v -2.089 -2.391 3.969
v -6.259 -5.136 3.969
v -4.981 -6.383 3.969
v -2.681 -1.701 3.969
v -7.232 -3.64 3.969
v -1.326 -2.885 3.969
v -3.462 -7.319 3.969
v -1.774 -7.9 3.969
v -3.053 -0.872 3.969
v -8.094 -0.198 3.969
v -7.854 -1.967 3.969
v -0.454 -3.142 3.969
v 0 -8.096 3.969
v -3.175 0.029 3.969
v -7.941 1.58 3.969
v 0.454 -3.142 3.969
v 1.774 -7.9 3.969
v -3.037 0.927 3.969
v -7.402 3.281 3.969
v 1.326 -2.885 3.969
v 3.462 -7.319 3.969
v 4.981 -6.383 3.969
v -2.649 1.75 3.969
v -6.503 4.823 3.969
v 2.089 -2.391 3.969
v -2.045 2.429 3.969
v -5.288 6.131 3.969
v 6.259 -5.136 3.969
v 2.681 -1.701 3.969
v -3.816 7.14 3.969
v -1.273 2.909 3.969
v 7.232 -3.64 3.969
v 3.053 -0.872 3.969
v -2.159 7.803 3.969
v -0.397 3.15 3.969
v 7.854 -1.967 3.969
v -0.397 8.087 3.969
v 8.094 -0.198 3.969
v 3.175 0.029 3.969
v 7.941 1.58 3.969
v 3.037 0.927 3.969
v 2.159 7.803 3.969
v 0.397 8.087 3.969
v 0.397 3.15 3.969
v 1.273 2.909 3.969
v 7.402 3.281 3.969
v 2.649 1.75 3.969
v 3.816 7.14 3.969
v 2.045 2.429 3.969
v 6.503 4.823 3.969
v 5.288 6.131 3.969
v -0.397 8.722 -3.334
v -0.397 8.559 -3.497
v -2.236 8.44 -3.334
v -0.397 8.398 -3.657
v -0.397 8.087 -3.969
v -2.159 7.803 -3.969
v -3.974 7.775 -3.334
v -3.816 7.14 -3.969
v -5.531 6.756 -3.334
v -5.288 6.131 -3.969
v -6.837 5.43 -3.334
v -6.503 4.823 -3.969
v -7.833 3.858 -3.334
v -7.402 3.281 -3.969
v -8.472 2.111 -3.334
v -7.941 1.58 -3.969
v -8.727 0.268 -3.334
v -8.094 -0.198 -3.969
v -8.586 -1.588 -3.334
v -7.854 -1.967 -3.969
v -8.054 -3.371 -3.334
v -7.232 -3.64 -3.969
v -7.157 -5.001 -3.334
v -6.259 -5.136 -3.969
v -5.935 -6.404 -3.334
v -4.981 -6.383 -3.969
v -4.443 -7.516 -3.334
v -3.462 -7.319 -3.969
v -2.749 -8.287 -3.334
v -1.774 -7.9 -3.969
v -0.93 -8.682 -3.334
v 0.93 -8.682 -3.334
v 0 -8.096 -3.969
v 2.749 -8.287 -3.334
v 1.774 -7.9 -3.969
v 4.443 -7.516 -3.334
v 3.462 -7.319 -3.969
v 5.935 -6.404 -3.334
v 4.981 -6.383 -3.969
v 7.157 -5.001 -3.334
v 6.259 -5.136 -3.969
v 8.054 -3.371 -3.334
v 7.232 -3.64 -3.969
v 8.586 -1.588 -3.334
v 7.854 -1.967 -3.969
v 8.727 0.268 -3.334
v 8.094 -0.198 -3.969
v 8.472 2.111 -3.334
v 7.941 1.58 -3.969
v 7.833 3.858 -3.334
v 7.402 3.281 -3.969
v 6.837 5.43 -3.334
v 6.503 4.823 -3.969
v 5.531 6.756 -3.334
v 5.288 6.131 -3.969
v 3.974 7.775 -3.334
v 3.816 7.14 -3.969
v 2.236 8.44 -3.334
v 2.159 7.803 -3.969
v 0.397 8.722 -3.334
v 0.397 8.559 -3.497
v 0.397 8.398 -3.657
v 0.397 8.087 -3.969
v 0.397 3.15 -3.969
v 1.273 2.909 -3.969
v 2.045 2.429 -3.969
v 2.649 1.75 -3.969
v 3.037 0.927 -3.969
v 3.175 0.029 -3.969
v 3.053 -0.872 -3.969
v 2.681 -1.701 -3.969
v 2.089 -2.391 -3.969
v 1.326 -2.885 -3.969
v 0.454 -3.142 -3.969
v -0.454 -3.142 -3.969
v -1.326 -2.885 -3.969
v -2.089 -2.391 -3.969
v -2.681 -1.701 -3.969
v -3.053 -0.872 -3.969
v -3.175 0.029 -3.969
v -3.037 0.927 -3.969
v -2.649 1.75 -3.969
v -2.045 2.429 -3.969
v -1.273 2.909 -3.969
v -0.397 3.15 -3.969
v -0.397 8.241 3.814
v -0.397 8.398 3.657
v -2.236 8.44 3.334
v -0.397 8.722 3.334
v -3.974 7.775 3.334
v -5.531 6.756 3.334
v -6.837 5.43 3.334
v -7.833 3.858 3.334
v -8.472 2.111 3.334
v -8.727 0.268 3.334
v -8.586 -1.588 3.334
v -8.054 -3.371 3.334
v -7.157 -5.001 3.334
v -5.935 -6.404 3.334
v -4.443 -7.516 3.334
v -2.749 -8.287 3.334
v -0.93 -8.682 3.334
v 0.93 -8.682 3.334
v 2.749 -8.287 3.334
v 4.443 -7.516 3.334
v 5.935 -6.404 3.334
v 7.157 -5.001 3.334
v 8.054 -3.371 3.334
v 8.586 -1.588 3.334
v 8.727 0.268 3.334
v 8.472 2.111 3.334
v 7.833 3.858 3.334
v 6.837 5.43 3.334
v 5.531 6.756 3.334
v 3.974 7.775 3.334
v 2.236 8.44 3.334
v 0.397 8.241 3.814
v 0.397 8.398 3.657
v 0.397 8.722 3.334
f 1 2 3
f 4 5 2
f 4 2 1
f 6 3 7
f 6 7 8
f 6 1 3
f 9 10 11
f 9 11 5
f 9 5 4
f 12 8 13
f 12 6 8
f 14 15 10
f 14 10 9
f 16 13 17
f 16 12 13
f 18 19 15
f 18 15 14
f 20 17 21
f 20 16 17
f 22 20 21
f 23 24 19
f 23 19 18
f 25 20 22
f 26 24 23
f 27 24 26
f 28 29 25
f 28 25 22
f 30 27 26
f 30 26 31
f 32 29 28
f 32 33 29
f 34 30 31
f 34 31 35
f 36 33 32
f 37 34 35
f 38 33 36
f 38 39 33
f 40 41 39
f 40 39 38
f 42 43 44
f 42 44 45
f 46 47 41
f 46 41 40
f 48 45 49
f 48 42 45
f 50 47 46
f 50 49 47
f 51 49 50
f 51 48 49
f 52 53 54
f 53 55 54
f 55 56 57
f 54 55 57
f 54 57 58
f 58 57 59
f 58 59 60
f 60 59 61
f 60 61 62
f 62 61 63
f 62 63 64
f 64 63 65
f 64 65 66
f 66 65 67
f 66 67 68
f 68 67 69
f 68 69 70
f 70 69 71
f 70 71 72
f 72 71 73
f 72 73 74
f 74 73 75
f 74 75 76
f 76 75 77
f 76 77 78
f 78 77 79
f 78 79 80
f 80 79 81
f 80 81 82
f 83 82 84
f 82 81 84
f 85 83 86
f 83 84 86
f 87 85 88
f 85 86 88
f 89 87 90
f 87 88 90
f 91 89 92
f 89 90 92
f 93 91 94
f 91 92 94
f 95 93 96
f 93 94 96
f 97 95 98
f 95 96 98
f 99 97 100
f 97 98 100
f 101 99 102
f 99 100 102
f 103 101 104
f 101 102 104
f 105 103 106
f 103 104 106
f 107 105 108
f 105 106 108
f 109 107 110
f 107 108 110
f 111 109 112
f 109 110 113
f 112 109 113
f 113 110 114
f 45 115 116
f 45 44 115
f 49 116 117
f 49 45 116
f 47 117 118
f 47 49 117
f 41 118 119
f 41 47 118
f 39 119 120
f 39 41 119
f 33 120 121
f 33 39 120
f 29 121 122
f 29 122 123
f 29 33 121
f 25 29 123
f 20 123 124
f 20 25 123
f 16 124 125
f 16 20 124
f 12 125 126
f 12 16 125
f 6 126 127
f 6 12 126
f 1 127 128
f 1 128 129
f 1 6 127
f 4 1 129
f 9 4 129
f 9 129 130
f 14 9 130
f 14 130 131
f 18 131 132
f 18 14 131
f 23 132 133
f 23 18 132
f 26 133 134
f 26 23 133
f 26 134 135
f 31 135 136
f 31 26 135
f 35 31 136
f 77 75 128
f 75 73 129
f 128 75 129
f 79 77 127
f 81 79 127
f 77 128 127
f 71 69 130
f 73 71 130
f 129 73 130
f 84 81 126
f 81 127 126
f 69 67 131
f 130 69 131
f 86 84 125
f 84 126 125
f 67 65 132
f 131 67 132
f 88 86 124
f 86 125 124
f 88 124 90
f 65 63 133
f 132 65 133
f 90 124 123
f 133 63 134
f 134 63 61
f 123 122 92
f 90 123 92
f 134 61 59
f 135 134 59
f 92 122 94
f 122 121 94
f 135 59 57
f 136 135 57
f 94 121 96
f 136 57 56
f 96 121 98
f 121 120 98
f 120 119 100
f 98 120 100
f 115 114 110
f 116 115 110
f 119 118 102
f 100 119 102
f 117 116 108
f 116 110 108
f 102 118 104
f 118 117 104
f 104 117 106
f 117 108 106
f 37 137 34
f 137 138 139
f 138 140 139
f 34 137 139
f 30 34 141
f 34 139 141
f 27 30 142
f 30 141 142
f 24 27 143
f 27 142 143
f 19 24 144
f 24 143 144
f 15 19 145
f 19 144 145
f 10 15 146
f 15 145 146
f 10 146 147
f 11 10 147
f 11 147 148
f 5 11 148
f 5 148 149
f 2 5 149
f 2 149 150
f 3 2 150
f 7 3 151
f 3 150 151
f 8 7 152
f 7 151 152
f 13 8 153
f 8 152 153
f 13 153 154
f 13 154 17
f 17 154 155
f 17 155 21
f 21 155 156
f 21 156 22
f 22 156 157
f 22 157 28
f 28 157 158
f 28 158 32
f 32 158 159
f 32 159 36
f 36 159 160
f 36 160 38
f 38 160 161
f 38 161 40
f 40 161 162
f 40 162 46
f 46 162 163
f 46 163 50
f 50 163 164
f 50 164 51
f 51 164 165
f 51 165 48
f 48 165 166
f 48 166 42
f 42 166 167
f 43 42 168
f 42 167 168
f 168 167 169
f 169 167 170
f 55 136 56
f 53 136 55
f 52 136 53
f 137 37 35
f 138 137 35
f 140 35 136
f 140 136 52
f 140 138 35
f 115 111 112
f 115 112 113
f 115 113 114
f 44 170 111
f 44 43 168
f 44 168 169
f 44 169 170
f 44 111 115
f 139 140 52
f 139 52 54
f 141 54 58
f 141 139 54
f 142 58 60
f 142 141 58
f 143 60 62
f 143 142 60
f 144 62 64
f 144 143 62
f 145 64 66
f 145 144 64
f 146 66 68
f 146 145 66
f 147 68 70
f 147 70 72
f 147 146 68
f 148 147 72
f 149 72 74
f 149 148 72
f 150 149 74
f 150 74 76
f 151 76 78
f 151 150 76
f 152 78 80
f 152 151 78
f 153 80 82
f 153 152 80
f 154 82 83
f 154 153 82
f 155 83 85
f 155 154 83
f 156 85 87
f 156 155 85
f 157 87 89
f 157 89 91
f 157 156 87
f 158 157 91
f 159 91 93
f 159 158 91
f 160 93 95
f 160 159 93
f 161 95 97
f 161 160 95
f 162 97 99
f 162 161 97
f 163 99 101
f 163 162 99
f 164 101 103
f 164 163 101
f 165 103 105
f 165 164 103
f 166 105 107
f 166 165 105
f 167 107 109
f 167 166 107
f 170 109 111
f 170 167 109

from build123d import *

# Parameters (mm, degrees)
EXTRUSION_DEPTH = 3.96875
CHAMFER1_SIZE   = 0.635


with BuildPart() as part:
    # profile → extrusion (new body, symmetric)
    with BuildSketch(Plane.XY):
        with BuildLine():
            Line((-0.396875, 3.150097655), (-0.396875, 8.72222545))
            ThreePointArc((-0.396875, 8.72222545), (0, -8.73125), (0.396875, 8.72222545))
            Line((0.396875, 8.72222545), (0.396875, 3.150097655))
            ThreePointArc((0.396875, 3.150097655), (0, -3.175), (-0.396875, 3.150097655))
        make_face()
    extrude(amount=EXTRUSION_DEPTH, both=True)

    # Chamfer1
    chamfer1_edges = [part.edges().sort_by_distance(p)[0] for p in [
        (0, -8.73125, 3.96875),
        (0, -8.73125, -3.96875),
    ]]
    chamfer(chamfer1_edges, length=CHAMFER1_SIZE)


solid = part.part
